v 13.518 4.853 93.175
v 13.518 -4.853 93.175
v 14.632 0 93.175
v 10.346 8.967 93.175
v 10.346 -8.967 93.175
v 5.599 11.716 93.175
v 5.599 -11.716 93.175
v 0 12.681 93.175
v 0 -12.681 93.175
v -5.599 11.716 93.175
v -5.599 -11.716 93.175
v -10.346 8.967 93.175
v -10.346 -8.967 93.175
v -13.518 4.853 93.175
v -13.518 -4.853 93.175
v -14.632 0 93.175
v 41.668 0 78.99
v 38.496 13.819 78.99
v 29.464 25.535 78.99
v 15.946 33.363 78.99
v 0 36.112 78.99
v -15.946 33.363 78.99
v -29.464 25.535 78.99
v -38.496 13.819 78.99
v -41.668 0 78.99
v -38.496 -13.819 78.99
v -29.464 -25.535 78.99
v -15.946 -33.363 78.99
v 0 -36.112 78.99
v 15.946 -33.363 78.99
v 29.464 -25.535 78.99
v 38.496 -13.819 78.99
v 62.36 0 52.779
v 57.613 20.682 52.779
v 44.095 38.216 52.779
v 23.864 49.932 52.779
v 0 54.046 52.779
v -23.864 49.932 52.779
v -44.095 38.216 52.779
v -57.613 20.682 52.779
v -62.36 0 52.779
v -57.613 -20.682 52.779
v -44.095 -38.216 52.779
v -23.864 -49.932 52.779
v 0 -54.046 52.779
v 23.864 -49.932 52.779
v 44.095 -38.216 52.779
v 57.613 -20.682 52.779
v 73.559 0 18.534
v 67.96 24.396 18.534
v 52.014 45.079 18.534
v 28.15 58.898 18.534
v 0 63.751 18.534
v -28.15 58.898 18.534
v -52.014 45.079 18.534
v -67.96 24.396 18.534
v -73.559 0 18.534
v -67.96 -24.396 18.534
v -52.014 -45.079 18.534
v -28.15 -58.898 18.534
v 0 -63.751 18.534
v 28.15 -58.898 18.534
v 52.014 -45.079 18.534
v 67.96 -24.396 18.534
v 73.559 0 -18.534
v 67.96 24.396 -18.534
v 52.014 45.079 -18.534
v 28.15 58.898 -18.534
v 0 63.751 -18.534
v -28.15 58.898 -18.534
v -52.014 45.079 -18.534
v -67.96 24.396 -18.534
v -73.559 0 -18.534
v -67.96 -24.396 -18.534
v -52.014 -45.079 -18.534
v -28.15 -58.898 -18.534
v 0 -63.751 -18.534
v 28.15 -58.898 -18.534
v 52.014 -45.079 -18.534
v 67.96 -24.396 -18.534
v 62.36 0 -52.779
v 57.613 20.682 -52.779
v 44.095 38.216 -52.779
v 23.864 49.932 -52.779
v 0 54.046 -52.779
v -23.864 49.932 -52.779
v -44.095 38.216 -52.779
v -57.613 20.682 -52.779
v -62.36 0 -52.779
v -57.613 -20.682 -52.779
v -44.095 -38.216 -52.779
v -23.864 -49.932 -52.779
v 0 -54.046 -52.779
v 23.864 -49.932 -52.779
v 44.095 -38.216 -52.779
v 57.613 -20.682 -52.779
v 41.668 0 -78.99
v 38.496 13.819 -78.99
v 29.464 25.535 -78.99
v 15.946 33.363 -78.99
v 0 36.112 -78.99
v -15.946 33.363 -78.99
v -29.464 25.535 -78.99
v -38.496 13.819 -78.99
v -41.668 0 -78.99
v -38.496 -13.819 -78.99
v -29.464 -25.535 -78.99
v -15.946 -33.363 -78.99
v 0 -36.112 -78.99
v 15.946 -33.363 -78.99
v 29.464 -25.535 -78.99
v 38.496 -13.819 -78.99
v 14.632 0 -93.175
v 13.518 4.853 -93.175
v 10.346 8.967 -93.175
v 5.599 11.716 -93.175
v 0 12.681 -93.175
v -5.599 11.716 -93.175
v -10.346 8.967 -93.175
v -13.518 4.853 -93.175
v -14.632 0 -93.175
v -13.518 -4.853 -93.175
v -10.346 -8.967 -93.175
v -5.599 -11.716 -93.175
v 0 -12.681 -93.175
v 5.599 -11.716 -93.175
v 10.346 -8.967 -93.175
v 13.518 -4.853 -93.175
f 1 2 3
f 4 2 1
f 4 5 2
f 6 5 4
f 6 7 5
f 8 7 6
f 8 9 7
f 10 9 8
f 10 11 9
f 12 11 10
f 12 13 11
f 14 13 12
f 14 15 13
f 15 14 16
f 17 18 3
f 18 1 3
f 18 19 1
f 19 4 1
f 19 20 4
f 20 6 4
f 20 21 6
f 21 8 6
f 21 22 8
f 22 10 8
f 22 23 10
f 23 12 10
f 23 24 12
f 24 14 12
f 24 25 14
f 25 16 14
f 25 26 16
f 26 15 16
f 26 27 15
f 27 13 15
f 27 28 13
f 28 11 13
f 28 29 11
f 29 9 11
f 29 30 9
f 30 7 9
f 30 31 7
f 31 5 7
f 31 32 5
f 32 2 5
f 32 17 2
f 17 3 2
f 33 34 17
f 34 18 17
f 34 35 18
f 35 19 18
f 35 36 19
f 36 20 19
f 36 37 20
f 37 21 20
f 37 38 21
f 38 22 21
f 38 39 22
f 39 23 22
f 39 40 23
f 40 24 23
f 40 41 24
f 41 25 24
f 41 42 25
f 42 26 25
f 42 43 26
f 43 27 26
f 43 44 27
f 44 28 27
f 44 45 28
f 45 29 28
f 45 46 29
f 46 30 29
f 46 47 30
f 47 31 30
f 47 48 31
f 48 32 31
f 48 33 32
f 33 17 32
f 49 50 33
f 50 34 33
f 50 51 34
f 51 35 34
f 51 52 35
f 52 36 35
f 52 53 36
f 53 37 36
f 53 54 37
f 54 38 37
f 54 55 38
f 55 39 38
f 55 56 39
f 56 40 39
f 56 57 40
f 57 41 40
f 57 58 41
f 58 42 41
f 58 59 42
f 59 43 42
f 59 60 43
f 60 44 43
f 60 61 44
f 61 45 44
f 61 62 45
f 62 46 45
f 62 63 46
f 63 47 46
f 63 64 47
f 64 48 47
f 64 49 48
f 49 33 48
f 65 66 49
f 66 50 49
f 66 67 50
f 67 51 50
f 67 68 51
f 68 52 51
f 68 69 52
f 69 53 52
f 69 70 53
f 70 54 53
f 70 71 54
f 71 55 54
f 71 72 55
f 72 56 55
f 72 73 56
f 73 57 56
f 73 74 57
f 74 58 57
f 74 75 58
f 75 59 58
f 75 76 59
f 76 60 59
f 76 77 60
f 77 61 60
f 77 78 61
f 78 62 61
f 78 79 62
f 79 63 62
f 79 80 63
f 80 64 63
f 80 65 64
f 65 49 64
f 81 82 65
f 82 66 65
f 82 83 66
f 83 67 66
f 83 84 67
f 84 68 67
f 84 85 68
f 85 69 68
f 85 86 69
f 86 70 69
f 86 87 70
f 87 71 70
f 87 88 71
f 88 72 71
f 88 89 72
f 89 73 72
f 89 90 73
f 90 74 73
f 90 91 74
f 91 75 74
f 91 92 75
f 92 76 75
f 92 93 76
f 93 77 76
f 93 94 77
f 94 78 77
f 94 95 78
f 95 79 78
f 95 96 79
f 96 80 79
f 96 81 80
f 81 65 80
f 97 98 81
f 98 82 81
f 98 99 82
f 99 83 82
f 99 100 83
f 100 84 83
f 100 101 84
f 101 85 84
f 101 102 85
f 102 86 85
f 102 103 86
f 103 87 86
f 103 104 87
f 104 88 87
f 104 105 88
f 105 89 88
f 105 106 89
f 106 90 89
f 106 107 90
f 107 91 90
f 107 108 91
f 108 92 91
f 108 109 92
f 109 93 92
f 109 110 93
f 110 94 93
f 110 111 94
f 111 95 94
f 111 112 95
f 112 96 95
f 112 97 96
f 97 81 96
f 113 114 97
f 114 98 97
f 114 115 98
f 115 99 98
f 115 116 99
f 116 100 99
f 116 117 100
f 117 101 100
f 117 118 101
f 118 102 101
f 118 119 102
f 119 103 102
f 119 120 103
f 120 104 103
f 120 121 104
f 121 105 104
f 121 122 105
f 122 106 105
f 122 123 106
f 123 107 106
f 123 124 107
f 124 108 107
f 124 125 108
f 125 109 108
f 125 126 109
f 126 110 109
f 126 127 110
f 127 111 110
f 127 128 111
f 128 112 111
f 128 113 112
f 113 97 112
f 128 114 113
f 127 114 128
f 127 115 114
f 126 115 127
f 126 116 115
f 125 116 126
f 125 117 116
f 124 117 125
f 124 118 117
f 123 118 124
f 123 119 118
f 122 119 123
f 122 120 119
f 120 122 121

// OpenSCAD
// Generated by SolidPython 1.0.1 on 2020-07-29 00:46:52


scale(v = [15, 13, 19]) {
	sphere(r = 5);
}
/***********************************************
*********      SolidPython code:      **********
************************************************
 
# import packages: SolidPython
from solid import *
from solid.utils import *
from itertools import chain, combinations, permutations


class Resize:

    def __init__(self, scad_file):
        self.scad_file = scad_file
        #self.scad_file = import_scad(scad_file)
        # cone/cylinder param:
        self.r1 = 0
        self.r2 = 0
        self.h = 0
        # rectangular prism param:
        self.w = 0
        self.l = 0
        # ellipse param:
        self.r = 0

    # import OpenScad code (file name corresponds to shape)


    # classify shape + parameters
    def assign(self, param1, param2, param3):
        if self.scad_file == 'cone.scad':
            self.r1 = param1
            self.r2 = param2
            self.h = param3
        elif self.scad_file == 'cylinder.scad':
            self.r1 = param1
            self.r2 = param2
            self.h = param3
        elif self.scad_file == 'rectangularPrism.scad':
            self.h = param1
            self.l = param2
            self.w = param3
        else:
            self.r = param1
            self.h = param2

    # resize parameters
    def iterate(self):
        x = range(3, 20, 2)
        i = 1
        if self.scad_file == 'cone.scad':
            tempList = list(permutations(x, 2))
            for temp in tempList:
                param1 = temp[0]
                param2 = temp[1]
                filepath = 'produced_scad_files/' + 'cone' + str(param1) + '_' + str(param2) + '_' + '.scad'
                scad_render_to_file(cylinder(h=param1, r1=param2, r2=0), filepath)

        elif self.scad_file == 'cylinder.scad':
            tempList = list(permutations(x, 3))
            for temp in tempList:
                param1 = temp[0]
                param2 = temp[1]
                filepath = 'produced_scad_files/' + 'cylinder' + str(param1) + '_' + str(param2) + '_' + '.scad'
                scad_render_to_file(cylinder(h=param1, r1=param2, r2=param2), filepath)

        elif self.scad_file == 'rectangularPrism.scad':
            tempList = list(permutations(x, 3))
            for temp in tempList:
                param1 = temp[0]
                param2 = temp[1]
                param3 = temp[2]
                filepath = 'produced_scad_files/' + 'rectangularPrism' + str(param1) + '_' + str(param2) + '_' + str(
                    param3) + '.scad'
                scad_render_to_file(cube(size=(param1, param2, param3)), filepath)

        elif self.scad_file == 'ellipse.scad':
            tempList = list(permutations(x, 4))
            for temp in tempList:
                param1 = temp[0]
                param2 = temp[1]
                param3 = temp[2]
                param4 = temp[3]
                filepath = 'produced_scad_files/' + 'ellipse' + str(param1) + '_' + str(param2) + '_' + str(param3) + '_' + str(param4) + '.scad'
                scad_render_to_file(scale([param1, param2, param3])(sphere(r=param4)), filepath)

    def render_to_scadfile(self):
        scad_render_to_file(scad, 'example.scad') 
 
************************************************/
